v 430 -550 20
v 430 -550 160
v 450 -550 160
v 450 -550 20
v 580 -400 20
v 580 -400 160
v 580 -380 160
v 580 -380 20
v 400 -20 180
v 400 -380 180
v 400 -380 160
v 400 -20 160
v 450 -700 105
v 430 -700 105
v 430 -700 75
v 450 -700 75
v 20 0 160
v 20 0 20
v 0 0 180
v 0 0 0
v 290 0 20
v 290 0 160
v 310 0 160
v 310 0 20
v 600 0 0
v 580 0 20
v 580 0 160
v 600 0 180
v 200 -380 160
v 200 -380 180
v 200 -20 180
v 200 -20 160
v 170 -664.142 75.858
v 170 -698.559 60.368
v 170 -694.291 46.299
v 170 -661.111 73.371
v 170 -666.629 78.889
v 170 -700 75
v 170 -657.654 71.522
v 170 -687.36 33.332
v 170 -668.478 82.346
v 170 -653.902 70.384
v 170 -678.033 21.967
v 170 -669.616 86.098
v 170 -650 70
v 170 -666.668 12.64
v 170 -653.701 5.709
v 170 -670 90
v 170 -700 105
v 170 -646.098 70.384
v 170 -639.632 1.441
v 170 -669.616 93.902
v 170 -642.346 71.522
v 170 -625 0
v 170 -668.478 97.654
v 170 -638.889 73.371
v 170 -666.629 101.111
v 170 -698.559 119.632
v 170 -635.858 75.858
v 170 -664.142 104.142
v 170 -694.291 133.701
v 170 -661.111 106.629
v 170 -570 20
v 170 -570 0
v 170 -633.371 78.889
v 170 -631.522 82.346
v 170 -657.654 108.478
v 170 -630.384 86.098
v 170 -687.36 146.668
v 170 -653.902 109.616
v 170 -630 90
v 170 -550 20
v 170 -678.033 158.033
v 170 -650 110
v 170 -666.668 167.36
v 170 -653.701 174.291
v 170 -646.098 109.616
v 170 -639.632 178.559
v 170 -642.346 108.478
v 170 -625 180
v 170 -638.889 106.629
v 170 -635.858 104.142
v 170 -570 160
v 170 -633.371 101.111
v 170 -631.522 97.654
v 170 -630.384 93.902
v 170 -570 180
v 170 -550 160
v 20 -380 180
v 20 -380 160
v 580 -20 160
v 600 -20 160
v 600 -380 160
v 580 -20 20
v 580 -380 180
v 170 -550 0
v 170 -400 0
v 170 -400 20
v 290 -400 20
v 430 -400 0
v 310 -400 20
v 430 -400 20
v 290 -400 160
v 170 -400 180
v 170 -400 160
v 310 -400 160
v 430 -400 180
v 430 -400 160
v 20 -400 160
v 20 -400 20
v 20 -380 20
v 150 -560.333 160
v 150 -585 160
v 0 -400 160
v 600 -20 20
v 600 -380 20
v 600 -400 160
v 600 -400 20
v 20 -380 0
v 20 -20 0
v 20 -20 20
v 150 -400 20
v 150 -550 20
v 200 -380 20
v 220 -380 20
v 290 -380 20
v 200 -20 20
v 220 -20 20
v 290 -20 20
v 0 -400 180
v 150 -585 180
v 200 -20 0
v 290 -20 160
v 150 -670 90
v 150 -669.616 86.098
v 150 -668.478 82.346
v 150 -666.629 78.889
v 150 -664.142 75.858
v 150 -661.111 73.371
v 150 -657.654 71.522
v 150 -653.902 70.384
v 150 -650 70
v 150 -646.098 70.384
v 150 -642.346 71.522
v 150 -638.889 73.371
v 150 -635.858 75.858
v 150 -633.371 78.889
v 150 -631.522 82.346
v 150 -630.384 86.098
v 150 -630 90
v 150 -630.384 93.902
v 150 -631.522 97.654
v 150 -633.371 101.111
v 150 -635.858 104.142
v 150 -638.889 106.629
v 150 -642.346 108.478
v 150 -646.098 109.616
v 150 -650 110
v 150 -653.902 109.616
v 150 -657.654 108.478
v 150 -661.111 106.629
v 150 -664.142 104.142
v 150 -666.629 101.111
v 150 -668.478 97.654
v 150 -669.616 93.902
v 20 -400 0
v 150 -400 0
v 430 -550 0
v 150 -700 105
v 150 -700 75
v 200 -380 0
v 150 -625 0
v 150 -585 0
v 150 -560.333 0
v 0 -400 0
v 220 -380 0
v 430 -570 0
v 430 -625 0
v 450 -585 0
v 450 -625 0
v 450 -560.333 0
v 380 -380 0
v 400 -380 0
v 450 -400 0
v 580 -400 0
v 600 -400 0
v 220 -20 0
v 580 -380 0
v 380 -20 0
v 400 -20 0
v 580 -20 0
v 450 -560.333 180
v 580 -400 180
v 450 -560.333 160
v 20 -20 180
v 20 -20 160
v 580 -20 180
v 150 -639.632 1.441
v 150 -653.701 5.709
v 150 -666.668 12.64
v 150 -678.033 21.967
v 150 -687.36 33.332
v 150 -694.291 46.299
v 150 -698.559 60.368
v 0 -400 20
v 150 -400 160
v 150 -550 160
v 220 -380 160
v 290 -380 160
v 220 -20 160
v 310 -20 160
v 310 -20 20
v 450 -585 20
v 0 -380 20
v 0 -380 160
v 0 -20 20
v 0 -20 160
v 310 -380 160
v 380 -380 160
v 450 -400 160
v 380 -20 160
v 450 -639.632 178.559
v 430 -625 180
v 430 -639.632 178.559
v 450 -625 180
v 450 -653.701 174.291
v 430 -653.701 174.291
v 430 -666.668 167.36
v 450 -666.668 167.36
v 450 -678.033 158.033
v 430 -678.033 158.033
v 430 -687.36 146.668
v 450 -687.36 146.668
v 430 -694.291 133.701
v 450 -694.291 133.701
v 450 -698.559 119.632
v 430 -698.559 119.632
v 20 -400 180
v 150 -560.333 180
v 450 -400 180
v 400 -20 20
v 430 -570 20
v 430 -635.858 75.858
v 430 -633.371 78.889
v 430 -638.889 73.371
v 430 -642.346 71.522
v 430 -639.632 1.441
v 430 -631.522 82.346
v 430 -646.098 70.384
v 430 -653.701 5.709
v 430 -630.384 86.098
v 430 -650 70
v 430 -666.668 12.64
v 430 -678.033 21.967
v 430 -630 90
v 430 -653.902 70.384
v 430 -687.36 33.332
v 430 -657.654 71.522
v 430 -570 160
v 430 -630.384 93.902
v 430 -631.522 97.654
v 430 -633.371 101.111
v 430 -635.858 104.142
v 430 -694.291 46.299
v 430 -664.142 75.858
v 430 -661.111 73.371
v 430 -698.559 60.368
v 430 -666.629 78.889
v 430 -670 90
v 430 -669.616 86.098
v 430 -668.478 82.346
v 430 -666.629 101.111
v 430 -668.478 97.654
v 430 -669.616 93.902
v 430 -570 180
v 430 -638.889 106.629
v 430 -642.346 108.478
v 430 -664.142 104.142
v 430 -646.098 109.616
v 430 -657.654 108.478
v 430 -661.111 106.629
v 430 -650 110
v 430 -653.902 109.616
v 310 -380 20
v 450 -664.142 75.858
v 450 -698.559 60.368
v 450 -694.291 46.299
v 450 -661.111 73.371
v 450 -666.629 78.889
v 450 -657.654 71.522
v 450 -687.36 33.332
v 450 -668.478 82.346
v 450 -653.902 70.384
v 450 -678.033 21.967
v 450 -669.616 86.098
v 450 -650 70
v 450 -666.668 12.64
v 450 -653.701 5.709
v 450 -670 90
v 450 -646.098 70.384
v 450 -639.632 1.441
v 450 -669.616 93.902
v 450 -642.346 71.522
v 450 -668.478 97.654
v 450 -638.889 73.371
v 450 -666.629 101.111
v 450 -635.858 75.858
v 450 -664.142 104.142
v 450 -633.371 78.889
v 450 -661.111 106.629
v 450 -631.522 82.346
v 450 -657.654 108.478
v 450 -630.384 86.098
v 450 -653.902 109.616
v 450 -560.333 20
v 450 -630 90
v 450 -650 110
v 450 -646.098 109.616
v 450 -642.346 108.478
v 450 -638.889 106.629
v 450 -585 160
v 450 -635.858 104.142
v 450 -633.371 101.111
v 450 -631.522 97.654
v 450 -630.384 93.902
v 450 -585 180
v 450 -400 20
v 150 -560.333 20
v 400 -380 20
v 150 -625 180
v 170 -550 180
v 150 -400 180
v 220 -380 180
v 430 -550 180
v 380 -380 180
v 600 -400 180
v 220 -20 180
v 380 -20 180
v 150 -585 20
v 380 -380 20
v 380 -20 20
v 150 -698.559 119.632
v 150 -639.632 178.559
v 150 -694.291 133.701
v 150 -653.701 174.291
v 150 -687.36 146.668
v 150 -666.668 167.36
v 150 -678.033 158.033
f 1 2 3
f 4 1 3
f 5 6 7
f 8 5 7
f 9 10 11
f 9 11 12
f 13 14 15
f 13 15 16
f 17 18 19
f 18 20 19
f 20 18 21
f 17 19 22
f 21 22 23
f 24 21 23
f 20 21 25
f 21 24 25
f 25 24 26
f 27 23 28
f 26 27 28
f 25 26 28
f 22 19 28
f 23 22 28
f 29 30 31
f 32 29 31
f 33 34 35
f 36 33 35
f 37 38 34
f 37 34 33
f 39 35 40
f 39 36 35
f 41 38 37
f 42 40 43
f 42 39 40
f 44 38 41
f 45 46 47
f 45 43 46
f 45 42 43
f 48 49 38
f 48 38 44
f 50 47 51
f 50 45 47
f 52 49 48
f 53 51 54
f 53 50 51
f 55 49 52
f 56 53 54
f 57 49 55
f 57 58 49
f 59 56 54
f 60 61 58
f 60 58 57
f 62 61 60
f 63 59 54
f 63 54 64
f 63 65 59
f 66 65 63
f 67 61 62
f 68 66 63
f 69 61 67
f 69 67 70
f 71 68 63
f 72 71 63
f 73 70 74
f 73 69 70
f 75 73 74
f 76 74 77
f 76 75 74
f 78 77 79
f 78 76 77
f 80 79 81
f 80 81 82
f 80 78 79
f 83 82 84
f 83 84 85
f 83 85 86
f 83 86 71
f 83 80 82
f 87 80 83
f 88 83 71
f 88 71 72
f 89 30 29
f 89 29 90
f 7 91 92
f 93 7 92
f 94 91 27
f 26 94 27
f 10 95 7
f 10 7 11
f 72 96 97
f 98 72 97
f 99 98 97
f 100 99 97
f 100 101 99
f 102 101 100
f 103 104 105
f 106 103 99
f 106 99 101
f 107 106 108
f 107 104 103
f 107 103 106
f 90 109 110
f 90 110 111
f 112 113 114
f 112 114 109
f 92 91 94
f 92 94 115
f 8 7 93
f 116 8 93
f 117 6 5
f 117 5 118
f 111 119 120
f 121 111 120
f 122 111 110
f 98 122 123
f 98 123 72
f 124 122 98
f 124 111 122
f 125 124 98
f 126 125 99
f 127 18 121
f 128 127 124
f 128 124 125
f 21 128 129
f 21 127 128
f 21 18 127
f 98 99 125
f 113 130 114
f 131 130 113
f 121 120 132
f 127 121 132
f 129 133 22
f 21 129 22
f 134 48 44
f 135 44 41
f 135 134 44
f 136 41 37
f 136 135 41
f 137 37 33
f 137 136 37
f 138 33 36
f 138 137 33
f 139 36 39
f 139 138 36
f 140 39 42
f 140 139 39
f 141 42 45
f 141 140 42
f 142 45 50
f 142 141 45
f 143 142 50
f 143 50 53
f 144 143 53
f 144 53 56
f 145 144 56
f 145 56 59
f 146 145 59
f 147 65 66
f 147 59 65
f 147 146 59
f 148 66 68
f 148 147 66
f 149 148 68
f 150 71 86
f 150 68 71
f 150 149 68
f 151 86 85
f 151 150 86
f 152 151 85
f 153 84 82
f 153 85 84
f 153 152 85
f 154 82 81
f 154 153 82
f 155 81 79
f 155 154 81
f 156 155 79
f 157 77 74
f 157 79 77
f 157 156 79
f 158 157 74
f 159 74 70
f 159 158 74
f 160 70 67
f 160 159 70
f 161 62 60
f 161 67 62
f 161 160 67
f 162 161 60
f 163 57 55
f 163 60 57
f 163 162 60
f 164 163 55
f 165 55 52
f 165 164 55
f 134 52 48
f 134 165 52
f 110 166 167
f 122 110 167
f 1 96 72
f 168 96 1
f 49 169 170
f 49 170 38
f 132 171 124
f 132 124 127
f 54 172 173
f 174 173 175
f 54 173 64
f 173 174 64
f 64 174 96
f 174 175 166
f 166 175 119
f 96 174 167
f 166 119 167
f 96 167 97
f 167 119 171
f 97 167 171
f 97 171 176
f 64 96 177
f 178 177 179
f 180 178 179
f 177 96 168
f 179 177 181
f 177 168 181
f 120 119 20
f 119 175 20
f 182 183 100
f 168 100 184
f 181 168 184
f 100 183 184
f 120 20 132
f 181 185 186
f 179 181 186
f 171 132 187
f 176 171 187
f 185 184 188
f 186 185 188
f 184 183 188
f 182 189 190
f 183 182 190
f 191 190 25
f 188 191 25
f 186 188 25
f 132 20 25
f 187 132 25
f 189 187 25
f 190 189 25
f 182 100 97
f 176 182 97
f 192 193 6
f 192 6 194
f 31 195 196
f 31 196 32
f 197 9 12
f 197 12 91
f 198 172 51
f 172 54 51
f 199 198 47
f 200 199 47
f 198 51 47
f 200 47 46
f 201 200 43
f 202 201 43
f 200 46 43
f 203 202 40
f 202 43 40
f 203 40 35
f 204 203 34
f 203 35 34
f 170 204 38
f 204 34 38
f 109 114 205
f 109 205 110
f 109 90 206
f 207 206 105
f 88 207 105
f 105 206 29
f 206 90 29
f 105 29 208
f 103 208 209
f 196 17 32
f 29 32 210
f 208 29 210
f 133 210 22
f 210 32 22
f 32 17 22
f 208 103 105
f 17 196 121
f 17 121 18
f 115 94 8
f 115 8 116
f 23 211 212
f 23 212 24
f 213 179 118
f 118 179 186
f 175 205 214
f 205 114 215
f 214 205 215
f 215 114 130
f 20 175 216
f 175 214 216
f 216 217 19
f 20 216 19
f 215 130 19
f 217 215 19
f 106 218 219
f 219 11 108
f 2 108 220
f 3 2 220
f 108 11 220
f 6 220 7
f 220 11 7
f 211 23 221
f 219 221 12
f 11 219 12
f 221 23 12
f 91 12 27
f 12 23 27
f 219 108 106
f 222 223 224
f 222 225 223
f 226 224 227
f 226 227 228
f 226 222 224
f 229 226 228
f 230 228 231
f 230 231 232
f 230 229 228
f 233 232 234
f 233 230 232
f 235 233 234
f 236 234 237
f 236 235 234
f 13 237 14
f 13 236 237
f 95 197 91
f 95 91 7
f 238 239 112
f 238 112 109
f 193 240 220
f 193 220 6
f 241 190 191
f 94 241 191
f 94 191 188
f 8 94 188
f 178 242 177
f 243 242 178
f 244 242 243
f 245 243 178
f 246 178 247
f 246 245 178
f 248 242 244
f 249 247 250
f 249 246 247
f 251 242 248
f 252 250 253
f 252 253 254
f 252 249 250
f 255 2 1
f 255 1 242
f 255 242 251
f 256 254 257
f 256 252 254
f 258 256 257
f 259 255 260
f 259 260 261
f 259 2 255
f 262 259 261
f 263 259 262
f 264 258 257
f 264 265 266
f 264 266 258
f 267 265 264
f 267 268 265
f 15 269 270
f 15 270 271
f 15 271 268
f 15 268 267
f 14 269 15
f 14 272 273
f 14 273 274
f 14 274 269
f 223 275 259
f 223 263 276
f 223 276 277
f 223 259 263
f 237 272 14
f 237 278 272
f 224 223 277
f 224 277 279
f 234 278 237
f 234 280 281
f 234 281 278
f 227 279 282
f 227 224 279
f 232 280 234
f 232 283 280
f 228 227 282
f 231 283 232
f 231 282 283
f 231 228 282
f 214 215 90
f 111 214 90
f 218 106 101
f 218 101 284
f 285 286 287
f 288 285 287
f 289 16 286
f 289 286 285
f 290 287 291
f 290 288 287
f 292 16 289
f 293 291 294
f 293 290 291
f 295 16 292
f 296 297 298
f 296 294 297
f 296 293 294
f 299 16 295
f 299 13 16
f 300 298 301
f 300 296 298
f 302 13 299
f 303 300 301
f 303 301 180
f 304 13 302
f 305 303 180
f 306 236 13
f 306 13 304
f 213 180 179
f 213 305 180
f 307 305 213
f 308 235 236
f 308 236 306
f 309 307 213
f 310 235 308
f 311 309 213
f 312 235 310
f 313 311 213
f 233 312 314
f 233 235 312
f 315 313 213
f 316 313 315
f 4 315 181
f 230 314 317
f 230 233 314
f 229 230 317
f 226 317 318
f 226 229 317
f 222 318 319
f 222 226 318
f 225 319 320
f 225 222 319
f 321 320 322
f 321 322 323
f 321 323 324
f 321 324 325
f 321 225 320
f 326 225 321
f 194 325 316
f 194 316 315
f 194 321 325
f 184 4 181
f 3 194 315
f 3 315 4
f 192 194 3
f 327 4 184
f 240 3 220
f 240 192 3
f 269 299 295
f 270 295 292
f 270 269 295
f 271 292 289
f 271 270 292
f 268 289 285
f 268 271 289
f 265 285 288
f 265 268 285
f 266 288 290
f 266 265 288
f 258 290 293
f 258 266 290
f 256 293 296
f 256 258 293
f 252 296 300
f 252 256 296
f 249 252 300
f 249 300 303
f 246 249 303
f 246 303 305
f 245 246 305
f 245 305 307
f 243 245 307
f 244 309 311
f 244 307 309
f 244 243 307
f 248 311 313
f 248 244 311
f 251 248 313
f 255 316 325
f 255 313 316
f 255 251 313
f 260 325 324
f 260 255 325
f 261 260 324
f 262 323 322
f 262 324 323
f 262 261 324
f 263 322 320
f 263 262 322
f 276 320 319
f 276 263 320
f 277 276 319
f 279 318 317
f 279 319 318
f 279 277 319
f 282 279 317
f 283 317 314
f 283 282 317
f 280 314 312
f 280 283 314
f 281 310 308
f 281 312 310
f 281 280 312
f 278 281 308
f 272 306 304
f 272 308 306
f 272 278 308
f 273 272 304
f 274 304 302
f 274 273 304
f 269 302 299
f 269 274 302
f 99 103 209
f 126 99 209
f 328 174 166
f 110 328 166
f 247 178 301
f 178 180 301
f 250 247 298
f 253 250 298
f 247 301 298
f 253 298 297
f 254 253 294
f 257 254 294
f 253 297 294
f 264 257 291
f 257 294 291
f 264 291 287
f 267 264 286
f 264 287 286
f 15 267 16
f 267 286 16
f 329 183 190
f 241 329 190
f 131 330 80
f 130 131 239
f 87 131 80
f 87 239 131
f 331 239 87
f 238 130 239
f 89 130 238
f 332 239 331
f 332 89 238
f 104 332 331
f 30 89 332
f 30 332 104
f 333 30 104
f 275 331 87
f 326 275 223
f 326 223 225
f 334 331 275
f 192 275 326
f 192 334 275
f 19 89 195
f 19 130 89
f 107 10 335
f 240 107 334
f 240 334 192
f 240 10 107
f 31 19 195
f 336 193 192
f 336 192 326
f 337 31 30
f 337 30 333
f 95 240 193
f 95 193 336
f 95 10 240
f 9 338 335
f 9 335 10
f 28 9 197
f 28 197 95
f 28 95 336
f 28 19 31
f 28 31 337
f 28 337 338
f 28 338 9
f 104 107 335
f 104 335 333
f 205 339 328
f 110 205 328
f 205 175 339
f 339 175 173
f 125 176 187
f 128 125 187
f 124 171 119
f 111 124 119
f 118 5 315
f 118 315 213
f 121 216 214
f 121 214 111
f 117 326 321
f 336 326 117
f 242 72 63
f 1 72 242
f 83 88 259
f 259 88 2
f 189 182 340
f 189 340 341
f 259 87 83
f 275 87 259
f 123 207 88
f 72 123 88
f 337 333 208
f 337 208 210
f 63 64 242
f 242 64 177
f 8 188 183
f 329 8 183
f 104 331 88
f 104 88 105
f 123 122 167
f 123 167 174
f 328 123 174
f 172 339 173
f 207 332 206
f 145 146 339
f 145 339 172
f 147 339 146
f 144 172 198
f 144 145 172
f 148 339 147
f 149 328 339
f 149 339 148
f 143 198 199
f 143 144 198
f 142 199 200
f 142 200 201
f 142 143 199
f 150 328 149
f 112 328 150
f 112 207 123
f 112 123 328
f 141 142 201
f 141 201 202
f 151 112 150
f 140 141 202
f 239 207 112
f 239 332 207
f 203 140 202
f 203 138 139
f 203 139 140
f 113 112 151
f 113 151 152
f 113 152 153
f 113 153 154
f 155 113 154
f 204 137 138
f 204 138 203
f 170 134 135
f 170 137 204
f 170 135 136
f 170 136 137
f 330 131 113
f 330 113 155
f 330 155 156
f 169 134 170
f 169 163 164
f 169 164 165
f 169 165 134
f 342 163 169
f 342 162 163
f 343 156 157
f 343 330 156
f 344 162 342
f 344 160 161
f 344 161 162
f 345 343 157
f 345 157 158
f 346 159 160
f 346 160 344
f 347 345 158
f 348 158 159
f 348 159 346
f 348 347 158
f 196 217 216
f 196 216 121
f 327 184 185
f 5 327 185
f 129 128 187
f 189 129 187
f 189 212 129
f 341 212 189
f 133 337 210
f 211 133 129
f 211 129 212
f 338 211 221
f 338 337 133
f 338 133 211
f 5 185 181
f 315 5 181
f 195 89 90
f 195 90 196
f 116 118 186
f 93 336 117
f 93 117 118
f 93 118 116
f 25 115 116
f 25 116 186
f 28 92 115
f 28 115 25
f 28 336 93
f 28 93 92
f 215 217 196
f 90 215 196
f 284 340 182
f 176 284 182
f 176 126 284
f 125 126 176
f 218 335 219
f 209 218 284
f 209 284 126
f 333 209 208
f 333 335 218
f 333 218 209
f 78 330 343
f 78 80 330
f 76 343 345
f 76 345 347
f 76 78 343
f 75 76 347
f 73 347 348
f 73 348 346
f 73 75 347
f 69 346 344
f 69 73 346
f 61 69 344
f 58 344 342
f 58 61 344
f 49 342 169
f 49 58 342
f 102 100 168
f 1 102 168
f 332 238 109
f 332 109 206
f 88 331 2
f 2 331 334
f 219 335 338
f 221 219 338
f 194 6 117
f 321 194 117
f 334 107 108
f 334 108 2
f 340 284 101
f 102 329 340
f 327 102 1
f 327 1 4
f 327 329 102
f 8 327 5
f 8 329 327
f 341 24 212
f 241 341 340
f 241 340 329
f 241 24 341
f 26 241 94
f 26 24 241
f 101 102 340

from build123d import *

# Parameters (mm, degrees)
F0_W     = 260
F0_H     = 20
F0_W_2   = 20
F0_H_2   = 360
F1_DEPTH = 20
F2_W     = 20
F2_H     = 20
F2_H_2   = 150
F3_DEPTH = 70
F5_D     = 40
F6_R     = 75


with BuildPart() as f1:
    # F0 (on Top) → F1 (new body)
    with BuildSketch(Plane.XY):
        Polygon((600, 0), (0, 0), (0, -20), (20, -20), (200, -20), (220, -20), (380, -20), (400, -20), (580, -20), (600, -20), align=None)
        Polygon((20, -20), (0, -20), (0, -400), (20, -400), (20, -380), align=None)
        Polygon((600, -400), (600, -20), (580, -20), (580, -380), (580, -400), align=None)
        Polygon((20, -400), (0, -400), (150, -585), (150, -560.333333), align=None)
        Polygon((450, -585), (600, -400), (580, -400), (450, -560.333333), align=None)
        Polygon((150, -560.333333), (150, -585), (150, -700), (170, -700), (170, -570), (170, -550), (170, -400), (150, -400), align=None)
        Polygon((450, -700), (450, -585), (450, -560.333333), (450, -400), (430, -400), (430, -550), (430, -570), (430, -700), align=None)
        with Locations((300, -560)):
            Rectangle(F0_W, F0_H)
        with Locations((390, -200)):
            Rectangle(F0_W_2, F0_H_2)
        Polygon((200, -380), (20, -380), (20, -400), (150, -400), (170, -400), (430, -400), (450, -400), (580, -400), (580, -380), (400, -380), (380, -380), (220, -380), align=None)
        with Locations((210, -200)):
            Rectangle(F0_W_2, F0_H_2)
    extrude(amount=F1_DEPTH)

    # F2 (on face) → F3 (join)
    with BuildSketch(Plane.XY.offset(20)):
        with Locations((10, -10)):
            Rectangle(F2_W, F2_H)
        with Locations((590, -10)):
            Rectangle(F2_W, F2_H)
        with Locations((590, -390)):
            Rectangle(F2_W, F2_H)
        with Locations((10, -390)):
            Rectangle(F2_W, F2_H)
        with Locations((160, -625)):
            Rectangle(F2_W, F2_H_2)
        with Locations((440, -625)):
            Rectangle(F2_W, F2_H_2)
        with Locations((300, -390)):
            Rectangle(F2_W, F2_H)
        with Locations((300, -10)):
            Rectangle(F2_W, F2_H)
    extrude(amount=F3_DEPTH)

    # F5 (through all)
    with Locations(Plane.YZ.offset(450)):
        with Locations((-650, 90)):
            Hole(F5_D / 2)

    # F6
    f6_edges = [f1.edges().sort_by_distance(p)[0] for p in [
        (160, -700, 0),
        (440, -700, 0),
    ]]
    fillet(f6_edges, radius=F6_R)

    # F7: F1 across face


with BuildPart() as f1_1:
    add(f1.part)
    add(f1.part.mirror(Plane(origin=(160, -590, 90), x_dir=(1, 0, 0), z_dir=(0, 0, 1))))


solid = f1_1.part
